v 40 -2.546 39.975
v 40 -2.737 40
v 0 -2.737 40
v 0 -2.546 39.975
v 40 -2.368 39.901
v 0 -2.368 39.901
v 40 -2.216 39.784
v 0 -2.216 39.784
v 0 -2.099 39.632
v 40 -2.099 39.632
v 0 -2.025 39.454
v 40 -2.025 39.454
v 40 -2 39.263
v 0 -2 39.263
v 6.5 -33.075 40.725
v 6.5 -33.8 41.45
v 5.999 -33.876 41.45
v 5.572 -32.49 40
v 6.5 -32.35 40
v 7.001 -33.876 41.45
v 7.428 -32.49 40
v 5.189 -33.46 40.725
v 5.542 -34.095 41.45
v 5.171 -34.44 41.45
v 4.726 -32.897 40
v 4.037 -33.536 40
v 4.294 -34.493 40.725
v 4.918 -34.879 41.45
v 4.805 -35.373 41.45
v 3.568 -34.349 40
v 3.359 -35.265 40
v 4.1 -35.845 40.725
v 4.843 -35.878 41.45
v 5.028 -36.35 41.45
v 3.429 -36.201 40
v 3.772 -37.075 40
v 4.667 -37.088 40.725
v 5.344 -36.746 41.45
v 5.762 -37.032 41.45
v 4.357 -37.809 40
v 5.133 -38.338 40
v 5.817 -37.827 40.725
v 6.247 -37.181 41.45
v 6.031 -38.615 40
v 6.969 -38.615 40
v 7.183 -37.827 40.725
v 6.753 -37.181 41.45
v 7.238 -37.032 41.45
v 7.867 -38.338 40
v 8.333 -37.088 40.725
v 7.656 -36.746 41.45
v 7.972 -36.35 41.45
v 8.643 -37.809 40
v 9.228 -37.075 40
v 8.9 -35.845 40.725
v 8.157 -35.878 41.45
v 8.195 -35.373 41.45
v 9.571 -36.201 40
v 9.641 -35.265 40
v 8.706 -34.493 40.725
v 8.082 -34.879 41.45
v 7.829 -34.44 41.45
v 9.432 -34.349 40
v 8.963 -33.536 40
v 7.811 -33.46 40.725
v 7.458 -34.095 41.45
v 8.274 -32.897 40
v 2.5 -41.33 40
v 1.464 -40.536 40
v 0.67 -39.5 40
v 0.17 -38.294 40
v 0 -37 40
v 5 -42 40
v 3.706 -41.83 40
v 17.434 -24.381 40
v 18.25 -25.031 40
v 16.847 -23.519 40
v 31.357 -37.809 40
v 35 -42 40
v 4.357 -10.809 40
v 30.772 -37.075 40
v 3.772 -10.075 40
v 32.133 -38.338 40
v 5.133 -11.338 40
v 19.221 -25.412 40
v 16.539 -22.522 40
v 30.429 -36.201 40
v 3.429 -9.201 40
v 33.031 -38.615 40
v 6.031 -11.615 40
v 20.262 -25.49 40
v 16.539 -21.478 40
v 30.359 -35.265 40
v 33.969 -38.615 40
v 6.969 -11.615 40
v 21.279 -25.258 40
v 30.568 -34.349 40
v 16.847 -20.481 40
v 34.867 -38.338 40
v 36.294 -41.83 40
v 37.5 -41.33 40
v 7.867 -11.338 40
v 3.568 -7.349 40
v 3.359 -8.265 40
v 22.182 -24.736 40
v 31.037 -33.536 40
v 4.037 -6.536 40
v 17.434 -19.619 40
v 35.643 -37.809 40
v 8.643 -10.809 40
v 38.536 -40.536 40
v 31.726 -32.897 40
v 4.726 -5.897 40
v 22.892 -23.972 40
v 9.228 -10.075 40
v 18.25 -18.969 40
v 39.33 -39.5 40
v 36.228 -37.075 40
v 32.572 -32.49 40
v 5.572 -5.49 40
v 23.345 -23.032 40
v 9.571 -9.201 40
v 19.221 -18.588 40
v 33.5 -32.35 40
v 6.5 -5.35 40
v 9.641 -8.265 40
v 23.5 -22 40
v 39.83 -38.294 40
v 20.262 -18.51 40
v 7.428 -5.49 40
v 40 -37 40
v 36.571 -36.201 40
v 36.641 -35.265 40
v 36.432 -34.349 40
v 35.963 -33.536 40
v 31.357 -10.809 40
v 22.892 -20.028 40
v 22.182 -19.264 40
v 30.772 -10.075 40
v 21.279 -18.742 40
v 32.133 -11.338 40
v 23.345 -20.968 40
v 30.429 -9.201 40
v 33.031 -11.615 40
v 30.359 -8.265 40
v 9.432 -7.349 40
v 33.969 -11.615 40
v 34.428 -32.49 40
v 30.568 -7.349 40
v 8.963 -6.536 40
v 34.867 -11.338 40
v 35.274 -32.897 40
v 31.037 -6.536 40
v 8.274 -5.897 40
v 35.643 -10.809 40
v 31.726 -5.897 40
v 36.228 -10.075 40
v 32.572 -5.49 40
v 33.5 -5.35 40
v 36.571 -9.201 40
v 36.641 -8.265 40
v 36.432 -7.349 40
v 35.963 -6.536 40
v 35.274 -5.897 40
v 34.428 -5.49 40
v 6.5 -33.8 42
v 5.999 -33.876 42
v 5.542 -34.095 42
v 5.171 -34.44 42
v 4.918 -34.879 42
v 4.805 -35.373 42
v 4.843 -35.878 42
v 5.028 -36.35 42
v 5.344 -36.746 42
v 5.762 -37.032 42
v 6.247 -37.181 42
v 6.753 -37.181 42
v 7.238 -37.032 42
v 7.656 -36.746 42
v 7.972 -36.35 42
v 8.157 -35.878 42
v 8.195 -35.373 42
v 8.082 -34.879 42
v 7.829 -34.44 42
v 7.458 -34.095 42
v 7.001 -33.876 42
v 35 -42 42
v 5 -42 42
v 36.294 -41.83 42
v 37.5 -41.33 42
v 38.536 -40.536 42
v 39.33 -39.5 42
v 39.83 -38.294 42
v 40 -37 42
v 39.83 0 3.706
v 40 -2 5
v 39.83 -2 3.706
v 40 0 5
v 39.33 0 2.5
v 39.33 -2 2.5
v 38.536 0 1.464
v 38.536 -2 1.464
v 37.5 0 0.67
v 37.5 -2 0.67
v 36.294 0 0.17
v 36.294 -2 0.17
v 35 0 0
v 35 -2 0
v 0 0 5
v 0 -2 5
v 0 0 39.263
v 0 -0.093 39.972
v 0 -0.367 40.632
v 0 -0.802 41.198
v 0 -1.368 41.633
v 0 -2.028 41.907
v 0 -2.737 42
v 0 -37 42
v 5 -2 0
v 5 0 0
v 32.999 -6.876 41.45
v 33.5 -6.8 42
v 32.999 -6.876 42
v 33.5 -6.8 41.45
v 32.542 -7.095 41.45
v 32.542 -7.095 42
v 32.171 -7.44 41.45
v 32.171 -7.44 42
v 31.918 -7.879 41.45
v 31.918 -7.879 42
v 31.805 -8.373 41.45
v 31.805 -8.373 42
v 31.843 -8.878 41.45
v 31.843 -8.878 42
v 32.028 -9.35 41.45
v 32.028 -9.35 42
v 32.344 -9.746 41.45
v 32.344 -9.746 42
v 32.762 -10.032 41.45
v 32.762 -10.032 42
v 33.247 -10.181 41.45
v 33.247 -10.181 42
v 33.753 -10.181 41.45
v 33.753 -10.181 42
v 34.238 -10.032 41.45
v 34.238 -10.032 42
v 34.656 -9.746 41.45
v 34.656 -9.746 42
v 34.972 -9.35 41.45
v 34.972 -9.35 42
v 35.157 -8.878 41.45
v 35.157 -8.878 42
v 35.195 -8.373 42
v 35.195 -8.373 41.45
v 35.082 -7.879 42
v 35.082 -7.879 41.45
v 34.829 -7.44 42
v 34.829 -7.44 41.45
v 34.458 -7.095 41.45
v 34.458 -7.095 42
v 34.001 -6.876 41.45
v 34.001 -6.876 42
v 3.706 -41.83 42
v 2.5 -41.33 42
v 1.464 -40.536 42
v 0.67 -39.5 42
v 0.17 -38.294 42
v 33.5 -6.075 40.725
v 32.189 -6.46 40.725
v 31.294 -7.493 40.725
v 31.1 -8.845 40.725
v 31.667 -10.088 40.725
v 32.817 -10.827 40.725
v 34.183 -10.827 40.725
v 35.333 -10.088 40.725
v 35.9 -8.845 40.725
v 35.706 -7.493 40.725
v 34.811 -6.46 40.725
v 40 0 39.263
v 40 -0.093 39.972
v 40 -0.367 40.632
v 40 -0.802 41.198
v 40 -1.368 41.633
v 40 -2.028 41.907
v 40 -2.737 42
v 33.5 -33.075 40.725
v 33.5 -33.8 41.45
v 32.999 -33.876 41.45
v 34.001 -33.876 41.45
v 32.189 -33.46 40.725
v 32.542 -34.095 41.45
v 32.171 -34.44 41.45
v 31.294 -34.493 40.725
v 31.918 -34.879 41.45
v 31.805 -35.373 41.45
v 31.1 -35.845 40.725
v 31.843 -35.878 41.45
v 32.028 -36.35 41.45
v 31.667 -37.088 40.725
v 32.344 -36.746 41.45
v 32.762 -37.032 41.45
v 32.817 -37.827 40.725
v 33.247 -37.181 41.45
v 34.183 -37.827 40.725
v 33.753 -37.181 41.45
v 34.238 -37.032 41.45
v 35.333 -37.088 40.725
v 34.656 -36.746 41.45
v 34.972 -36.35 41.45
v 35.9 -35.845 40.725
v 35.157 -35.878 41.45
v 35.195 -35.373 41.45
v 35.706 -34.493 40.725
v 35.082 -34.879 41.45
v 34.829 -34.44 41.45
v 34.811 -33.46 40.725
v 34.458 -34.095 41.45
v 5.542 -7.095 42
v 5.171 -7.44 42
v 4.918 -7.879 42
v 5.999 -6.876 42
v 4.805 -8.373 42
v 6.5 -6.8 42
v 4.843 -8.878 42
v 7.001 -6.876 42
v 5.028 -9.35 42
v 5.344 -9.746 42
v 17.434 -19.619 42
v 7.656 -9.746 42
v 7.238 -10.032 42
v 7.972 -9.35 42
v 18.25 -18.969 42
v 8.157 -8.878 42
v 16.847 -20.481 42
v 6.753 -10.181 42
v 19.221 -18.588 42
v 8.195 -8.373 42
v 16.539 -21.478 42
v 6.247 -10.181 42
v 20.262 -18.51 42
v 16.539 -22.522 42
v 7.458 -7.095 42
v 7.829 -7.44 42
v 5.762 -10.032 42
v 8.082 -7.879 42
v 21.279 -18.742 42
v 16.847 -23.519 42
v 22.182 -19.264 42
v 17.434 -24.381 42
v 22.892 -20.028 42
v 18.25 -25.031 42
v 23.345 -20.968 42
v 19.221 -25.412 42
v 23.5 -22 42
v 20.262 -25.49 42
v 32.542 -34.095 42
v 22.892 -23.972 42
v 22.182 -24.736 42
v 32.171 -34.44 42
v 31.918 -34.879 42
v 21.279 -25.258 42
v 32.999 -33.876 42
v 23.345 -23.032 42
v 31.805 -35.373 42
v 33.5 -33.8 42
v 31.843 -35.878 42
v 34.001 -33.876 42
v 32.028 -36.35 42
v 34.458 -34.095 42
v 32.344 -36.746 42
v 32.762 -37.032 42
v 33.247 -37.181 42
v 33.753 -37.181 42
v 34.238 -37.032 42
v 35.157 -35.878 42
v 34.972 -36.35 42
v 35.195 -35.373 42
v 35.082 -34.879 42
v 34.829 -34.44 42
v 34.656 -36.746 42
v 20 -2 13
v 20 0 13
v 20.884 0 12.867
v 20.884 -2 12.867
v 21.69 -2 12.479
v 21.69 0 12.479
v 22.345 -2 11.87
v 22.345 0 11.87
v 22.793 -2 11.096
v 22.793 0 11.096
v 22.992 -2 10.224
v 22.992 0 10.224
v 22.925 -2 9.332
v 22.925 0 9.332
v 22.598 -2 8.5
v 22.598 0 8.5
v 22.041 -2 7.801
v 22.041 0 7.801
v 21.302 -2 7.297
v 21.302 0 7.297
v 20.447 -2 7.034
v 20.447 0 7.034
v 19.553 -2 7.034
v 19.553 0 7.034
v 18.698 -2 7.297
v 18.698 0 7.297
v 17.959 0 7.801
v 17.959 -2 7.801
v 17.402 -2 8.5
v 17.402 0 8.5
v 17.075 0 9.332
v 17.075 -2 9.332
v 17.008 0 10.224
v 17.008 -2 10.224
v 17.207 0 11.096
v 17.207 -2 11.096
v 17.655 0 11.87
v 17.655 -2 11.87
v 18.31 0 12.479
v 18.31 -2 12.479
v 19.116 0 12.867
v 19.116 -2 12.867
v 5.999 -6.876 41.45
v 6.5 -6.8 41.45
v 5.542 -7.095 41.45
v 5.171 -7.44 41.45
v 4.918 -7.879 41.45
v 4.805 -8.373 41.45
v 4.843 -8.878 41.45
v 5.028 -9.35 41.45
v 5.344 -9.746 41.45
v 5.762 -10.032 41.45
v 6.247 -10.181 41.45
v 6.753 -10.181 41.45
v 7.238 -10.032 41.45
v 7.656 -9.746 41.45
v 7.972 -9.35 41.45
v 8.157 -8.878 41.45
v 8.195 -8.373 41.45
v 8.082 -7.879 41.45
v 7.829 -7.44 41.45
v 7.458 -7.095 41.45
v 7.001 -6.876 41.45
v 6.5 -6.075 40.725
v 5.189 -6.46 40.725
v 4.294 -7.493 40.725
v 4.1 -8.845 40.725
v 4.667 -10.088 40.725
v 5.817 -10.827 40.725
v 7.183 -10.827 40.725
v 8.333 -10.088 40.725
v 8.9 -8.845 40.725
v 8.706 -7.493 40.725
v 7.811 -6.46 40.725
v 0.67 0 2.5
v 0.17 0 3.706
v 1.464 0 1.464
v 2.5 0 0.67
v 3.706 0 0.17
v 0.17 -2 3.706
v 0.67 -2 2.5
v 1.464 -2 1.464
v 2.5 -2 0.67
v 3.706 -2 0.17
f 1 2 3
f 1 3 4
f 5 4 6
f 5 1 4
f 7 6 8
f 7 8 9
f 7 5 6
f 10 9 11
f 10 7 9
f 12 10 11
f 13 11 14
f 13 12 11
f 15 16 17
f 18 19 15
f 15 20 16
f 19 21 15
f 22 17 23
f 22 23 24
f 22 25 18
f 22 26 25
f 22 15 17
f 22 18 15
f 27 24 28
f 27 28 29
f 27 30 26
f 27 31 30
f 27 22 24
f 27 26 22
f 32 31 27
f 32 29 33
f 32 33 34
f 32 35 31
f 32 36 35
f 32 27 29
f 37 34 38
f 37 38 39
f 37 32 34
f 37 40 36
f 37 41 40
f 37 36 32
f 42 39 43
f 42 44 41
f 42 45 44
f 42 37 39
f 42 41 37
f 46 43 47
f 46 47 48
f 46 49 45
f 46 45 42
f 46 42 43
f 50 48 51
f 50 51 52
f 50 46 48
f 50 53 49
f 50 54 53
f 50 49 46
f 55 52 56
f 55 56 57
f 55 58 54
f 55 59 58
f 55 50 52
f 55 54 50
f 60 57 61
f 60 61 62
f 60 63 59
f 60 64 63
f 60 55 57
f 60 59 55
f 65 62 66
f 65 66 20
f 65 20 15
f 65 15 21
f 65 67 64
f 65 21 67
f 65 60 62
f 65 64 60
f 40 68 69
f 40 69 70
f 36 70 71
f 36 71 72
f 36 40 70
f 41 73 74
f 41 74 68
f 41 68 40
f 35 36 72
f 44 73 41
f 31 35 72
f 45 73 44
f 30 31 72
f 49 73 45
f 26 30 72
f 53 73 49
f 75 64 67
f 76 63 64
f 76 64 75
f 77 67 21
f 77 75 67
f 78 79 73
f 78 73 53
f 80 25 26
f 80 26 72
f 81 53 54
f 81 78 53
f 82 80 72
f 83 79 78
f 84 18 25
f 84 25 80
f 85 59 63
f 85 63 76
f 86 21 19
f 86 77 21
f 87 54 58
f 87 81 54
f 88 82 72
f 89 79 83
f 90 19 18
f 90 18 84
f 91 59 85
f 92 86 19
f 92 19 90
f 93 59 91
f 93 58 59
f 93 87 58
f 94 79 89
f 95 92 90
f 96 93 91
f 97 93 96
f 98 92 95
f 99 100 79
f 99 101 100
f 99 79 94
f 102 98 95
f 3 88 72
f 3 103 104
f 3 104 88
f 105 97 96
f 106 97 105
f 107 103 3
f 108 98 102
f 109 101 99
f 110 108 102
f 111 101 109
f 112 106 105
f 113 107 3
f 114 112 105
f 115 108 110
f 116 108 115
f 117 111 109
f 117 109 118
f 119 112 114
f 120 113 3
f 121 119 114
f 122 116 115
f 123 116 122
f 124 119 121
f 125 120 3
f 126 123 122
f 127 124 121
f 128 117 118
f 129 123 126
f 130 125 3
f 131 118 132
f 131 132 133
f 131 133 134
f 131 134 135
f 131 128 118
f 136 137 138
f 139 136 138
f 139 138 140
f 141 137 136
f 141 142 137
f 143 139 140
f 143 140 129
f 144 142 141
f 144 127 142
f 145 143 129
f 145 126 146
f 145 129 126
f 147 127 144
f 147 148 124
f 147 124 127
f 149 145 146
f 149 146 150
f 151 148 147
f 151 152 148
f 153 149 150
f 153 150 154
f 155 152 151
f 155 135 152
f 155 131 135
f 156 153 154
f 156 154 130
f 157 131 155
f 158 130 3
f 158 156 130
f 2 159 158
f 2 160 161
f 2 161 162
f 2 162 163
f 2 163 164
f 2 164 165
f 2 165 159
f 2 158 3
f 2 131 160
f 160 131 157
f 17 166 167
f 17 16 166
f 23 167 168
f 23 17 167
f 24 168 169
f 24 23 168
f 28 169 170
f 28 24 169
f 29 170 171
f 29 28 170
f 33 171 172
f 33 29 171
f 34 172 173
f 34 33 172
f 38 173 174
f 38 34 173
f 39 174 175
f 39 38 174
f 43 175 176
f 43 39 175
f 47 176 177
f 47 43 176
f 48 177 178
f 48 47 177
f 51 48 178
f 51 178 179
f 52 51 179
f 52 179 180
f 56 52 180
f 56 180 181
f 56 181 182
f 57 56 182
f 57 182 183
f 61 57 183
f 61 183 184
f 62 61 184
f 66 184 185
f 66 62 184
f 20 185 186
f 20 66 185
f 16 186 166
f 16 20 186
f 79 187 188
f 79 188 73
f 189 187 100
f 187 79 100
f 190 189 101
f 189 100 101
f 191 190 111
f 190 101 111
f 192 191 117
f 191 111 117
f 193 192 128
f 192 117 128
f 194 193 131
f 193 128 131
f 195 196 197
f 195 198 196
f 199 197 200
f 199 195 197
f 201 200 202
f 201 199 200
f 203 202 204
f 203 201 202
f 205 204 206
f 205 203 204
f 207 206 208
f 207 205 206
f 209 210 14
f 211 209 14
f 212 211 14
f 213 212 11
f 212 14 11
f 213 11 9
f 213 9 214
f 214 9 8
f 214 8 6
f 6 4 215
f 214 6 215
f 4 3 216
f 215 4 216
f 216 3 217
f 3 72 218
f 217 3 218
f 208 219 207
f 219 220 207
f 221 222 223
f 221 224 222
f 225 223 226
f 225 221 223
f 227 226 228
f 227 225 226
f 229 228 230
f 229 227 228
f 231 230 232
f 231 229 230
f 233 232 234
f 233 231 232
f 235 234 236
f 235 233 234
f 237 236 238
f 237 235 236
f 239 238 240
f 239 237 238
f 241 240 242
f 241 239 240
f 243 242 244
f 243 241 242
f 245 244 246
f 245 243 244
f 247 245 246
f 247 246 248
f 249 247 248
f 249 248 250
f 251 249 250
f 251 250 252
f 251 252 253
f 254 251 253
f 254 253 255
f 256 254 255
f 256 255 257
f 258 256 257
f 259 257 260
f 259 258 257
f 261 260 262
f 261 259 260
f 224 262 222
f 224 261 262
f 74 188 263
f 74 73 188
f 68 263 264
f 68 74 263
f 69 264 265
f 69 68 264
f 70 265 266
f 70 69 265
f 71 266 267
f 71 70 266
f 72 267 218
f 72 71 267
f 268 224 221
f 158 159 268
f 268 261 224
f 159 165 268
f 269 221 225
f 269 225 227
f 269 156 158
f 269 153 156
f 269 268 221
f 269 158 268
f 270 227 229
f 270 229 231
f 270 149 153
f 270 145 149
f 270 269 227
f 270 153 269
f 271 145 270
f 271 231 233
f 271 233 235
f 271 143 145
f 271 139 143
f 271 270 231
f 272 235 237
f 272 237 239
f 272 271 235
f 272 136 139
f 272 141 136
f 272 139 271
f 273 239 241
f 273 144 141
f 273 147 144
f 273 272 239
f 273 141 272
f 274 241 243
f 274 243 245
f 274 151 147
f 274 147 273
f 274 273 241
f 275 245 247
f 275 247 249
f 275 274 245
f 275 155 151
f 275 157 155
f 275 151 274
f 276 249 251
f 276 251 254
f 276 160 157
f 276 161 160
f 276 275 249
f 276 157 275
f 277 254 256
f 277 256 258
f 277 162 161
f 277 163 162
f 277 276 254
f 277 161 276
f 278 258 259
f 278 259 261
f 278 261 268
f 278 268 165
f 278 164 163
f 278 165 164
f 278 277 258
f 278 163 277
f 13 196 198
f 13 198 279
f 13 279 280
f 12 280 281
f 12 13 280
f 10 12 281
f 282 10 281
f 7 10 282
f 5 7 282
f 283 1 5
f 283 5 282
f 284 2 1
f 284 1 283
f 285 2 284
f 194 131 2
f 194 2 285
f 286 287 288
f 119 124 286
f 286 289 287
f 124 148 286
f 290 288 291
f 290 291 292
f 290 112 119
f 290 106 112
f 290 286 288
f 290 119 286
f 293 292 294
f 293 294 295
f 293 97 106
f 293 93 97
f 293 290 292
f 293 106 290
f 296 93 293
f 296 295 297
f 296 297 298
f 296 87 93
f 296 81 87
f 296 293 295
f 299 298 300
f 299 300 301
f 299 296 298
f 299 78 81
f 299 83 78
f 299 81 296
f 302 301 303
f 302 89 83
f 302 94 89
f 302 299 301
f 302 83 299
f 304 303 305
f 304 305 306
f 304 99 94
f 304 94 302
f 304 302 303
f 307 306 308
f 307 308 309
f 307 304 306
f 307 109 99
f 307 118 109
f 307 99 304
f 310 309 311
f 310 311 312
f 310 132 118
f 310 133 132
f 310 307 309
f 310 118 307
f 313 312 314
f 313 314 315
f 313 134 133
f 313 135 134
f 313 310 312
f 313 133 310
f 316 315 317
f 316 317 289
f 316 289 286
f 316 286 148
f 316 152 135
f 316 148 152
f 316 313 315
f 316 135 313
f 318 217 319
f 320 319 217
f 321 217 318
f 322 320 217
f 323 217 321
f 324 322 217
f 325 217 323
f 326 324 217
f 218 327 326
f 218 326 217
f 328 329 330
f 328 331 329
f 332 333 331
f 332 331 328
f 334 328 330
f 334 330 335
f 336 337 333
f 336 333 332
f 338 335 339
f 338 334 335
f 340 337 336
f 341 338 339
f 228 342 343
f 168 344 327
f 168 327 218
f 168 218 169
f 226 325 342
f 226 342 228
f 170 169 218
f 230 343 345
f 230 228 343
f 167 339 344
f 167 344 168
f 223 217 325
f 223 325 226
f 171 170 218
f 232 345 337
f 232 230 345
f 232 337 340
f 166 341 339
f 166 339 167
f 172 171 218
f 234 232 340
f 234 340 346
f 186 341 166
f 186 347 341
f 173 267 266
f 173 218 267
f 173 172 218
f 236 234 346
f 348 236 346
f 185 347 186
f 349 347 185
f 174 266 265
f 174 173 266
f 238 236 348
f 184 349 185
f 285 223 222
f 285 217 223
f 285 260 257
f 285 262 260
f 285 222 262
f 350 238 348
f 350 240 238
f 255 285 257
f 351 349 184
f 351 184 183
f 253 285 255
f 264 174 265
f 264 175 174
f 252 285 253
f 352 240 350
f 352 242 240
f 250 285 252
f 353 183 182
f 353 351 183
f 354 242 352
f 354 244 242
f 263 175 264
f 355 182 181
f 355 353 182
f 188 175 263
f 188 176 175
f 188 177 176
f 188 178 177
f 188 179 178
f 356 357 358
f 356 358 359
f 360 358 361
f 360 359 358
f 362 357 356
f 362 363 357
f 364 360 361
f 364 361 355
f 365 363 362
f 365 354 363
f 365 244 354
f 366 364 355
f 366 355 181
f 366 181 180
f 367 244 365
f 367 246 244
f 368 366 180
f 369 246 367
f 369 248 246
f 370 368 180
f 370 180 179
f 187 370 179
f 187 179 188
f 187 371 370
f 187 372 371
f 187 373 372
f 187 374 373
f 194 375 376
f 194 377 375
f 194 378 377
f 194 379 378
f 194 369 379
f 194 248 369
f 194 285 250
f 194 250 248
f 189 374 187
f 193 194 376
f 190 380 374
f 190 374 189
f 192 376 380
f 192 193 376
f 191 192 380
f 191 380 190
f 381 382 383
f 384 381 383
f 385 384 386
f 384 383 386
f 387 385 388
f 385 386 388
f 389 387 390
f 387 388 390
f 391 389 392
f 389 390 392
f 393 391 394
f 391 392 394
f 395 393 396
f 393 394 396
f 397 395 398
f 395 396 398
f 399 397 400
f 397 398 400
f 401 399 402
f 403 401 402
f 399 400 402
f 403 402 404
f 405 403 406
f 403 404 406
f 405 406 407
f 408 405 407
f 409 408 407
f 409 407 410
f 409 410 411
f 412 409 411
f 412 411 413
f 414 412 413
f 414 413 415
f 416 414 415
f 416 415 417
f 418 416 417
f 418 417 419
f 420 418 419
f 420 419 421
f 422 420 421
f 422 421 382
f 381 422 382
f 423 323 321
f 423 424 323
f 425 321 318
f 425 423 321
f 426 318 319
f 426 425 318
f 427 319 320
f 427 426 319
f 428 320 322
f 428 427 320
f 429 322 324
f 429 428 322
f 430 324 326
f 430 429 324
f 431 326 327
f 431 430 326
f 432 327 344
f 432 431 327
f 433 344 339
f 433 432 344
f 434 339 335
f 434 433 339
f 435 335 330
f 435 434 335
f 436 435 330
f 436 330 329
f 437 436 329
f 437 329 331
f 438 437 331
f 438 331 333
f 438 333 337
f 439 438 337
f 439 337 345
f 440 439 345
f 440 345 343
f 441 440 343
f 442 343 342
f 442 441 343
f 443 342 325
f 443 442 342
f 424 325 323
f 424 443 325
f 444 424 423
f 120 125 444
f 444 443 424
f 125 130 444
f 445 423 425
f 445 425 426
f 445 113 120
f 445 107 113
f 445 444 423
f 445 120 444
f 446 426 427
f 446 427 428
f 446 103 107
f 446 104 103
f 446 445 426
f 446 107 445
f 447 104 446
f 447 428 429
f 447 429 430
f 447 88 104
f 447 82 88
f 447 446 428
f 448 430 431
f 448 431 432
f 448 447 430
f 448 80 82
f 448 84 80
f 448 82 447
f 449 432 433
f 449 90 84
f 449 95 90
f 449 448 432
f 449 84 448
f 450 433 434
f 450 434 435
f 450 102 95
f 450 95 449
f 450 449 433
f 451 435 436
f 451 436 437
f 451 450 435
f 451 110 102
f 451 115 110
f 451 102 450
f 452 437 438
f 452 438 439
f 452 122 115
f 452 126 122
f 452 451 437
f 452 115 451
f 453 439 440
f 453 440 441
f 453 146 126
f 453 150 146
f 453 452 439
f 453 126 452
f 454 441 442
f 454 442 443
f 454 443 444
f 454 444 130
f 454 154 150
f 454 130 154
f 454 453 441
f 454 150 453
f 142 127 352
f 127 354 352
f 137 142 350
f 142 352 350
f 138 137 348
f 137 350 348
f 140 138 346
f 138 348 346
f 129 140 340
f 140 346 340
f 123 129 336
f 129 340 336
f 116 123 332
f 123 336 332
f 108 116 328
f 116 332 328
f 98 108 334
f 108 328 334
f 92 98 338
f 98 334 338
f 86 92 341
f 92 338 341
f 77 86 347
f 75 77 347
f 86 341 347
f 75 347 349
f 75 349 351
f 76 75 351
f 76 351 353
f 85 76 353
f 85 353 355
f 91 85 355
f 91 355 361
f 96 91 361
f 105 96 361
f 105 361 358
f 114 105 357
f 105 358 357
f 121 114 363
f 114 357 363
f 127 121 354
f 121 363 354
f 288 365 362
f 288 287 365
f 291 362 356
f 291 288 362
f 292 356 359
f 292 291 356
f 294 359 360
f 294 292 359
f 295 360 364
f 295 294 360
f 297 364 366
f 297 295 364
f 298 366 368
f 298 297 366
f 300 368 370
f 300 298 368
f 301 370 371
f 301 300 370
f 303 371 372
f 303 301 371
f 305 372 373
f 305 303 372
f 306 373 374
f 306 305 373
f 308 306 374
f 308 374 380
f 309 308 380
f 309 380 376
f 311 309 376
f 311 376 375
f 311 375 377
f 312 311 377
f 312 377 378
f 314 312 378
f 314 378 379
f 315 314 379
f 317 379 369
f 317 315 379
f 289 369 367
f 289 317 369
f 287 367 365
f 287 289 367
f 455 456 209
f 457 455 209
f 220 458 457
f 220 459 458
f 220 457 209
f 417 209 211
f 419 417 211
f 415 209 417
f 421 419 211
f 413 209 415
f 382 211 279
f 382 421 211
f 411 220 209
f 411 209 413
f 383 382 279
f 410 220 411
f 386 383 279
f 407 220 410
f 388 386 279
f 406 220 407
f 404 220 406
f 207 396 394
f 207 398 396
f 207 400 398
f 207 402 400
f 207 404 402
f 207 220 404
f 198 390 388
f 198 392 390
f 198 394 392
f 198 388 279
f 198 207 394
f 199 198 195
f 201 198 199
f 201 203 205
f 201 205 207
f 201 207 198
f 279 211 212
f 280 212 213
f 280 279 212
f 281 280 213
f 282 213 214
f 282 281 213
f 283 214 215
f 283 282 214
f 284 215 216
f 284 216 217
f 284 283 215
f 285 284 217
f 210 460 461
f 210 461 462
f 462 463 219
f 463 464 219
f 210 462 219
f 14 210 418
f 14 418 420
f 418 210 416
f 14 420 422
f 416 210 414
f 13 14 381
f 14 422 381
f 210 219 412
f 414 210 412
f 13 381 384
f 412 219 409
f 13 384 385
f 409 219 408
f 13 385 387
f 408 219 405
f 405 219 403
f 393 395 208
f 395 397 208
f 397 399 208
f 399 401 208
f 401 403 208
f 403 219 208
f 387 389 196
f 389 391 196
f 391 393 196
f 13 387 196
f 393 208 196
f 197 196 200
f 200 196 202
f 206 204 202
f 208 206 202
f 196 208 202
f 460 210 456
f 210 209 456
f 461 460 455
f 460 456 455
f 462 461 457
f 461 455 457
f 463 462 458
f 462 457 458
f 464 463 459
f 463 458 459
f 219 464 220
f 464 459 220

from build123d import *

# Parameters (mm, degrees)
SKETCH_1_W                       = 40
SKETCH_1_H                       = 2
SM_BASE_FLANGE_1_DEPTH           = 40
CUT_EXTRUDE_1_REACH              = 58.604
SKETCH_3_R                       = 3
SM_EDGE_FLANGE_1_STRIP_W         = 9.4732
SM_EDGE_FLANGE_1_STRIP_H         = 2
SM_EDGE_FLANGE_1_STRIP_CUT_DEPTH = 40
SM_EDGE_FLANGE_1_DEPTH           = 40
FILLET_1_R                       = 5
HOLE_WIZARD_M3_1_AT_2_COUNT      = 2
HOLE_WIZARD_M3_1_AT_2_PITCH      = 27
HOLE_WIZARD_M3_1_AT_3_COUNT      = 2
HOLE_WIZARD_M3_1_AT_3_PITCH      = 38.183766184
HOLE_WIZARD_M3_1_AT_4_COUNT      = 2
HOLE_WIZARD_M3_1_AT_4_PITCH      = 27
HOLE_WIZARD_7_0_7_1_D            = 7
HOLE_WIZARD_7_0_7_1_DEPTH        = 2
HOLE_WIZARD_7_0_7_1_TIP          = 2.103012167


# Sheet-metal steps are written as plain solids
with BuildPart() as part:
    # Sketch 1 → 基材-凸緣1 (new body)
    with BuildSketch(Plane.XY):
        with Locations((20, -1)):
            Rectangle(SKETCH_1_W, SKETCH_1_H)
    extrude(amount=SM_BASE_FLANGE_1_DEPTH)

    # 草圖3 → 除料-伸長1 (cut, up to next)
    with BuildSketch(Plane(origin=(0, 0, 0), x_dir=(-1, 0, 0), z_dir=(0, 1, 0)), mode=Mode.PRIVATE) as cut_extrude_1_sk1:
        with Locations(Location((-20, 10, 0), (0, 0, 90))):
            Circle(SKETCH_3_R)
    cut_extrude_1_tool1 = extrude(cut_extrude_1_sk1.sketch, amount=-CUT_EXTRUDE_1_REACH, mode=Mode.PRIVATE) & part.part
    add(cut_extrude_1_tool1.solids().sort_by_distance((20, 0, 10))[0], mode=Mode.SUBTRACT)

    # 邊線-凸緣1 strip (across the edge) → 邊線-凸緣1 strip cut (cut)
    with BuildSketch(Plane(origin=(40, -2, 40), x_dir=(0, 0, -1), z_dir=(-1, 0, 0))):
        with Locations((-4, -1)):
            Rectangle(SM_EDGE_FLANGE_1_STRIP_W, SM_EDGE_FLANGE_1_STRIP_H)
    extrude(amount=SM_EDGE_FLANGE_1_STRIP_CUT_DEPTH, mode=Mode.SUBTRACT)

    # 邊線-凸緣1 section (across the edge) → 邊線-凸緣1 (add)
    with BuildSketch(Plane(origin=(40, -2, 40), x_dir=(0, 0, -1), z_dir=(-1, 0, 0))):
        with BuildLine():
            Line((-2, 0.7366), (-2, 40))
            Line((-2, 40), (0, 40))
            Line((0, 40), (0, 0.7366))
            ThreePointArc((0, 0.7366), (0.215745145, 0.215745145), (0.7366, 0))
            Line((0.7366, 0), (0.7366, -2))
            ThreePointArc((0.7366, -2), (-1.198468417, -1.198468417), (-2, 0.7366))
        make_face()
    extrude(amount=SM_EDGE_FLANGE_1_DEPTH)

    # 圓角1
    fillet_1_edges = [part.edges().sort_by_distance(p)[0] for p in [
        (0, -1, 0),
        (40, -42, 41),
        (0, -42, 41),
        (40, -1, 0),
    ]]
    fillet(fillet_1_edges, radius=FILLET_1_R)

    # 草圖7 → M3 平錐坑頭螺釘的錐孔1 (revolve, cut)
    with BuildSketch(Plane(origin=(33.5, -35.5, 40), x_dir=(0, 1, 0), z_dir=(1, 0, 0))):
        Polygon((0, 0), (0, 2), (1.7, 2), (1.7, 1.45), (3.15, 0), align=None)
    hole_wizard_m3_1 = revolve(axis=Axis((33.5, -35.5, 33.65), (0, 0, 1)), mode=Mode.SUBTRACT)

    # M3 平錐坑頭螺釘的錐孔1 at 2: M3 平錐坑頭螺釘的錐孔1 ×2
    with Locations(*[(0, i * HOLE_WIZARD_M3_1_AT_2_PITCH, 0) for i in range(1, HOLE_WIZARD_M3_1_AT_2_COUNT)]):
        add(hole_wizard_m3_1, mode=Mode.SUBTRACT)

    # M3 平錐坑頭螺釘的錐孔1 at 3: M3 平錐坑頭螺釘的錐孔1 ×2
    with Locations(*[Vector(-0.7071067811865475, 0.7071067811865477, -2.465626675858965e-15) * (i * HOLE_WIZARD_M3_1_AT_3_PITCH) for i in range(1, HOLE_WIZARD_M3_1_AT_3_COUNT)]):
        add(hole_wizard_m3_1, mode=Mode.SUBTRACT)

    # M3 平錐坑頭螺釘的錐孔1 at 4: M3 平錐坑頭螺釘的錐孔1 ×2
    with Locations(*[(-i * HOLE_WIZARD_M3_1_AT_4_PITCH, 0, 0) for i in range(1, HOLE_WIZARD_M3_1_AT_4_COUNT)]):
        add(hole_wizard_m3_1, mode=Mode.SUBTRACT)

    # Ø7.0 (7) 直徑孔1
    with Locations(Plane(origin=(0, 0, 40), x_dir=(-1, 0, 0), z_dir=(0, 0, -1))):
        with Locations((-20, -22)):
            Hole(HOLE_WIZARD_7_0_7_1_D / 2, depth=HOLE_WIZARD_7_0_7_1_DEPTH)
            with Locations((0, 0, -(HOLE_WIZARD_7_0_7_1_DEPTH + HOLE_WIZARD_7_0_7_1_TIP / 2))):  # 118° drill point
                Cone(0, HOLE_WIZARD_7_0_7_1_D / 2, HOLE_WIZARD_7_0_7_1_TIP, mode=Mode.SUBTRACT)


solid = part.part
